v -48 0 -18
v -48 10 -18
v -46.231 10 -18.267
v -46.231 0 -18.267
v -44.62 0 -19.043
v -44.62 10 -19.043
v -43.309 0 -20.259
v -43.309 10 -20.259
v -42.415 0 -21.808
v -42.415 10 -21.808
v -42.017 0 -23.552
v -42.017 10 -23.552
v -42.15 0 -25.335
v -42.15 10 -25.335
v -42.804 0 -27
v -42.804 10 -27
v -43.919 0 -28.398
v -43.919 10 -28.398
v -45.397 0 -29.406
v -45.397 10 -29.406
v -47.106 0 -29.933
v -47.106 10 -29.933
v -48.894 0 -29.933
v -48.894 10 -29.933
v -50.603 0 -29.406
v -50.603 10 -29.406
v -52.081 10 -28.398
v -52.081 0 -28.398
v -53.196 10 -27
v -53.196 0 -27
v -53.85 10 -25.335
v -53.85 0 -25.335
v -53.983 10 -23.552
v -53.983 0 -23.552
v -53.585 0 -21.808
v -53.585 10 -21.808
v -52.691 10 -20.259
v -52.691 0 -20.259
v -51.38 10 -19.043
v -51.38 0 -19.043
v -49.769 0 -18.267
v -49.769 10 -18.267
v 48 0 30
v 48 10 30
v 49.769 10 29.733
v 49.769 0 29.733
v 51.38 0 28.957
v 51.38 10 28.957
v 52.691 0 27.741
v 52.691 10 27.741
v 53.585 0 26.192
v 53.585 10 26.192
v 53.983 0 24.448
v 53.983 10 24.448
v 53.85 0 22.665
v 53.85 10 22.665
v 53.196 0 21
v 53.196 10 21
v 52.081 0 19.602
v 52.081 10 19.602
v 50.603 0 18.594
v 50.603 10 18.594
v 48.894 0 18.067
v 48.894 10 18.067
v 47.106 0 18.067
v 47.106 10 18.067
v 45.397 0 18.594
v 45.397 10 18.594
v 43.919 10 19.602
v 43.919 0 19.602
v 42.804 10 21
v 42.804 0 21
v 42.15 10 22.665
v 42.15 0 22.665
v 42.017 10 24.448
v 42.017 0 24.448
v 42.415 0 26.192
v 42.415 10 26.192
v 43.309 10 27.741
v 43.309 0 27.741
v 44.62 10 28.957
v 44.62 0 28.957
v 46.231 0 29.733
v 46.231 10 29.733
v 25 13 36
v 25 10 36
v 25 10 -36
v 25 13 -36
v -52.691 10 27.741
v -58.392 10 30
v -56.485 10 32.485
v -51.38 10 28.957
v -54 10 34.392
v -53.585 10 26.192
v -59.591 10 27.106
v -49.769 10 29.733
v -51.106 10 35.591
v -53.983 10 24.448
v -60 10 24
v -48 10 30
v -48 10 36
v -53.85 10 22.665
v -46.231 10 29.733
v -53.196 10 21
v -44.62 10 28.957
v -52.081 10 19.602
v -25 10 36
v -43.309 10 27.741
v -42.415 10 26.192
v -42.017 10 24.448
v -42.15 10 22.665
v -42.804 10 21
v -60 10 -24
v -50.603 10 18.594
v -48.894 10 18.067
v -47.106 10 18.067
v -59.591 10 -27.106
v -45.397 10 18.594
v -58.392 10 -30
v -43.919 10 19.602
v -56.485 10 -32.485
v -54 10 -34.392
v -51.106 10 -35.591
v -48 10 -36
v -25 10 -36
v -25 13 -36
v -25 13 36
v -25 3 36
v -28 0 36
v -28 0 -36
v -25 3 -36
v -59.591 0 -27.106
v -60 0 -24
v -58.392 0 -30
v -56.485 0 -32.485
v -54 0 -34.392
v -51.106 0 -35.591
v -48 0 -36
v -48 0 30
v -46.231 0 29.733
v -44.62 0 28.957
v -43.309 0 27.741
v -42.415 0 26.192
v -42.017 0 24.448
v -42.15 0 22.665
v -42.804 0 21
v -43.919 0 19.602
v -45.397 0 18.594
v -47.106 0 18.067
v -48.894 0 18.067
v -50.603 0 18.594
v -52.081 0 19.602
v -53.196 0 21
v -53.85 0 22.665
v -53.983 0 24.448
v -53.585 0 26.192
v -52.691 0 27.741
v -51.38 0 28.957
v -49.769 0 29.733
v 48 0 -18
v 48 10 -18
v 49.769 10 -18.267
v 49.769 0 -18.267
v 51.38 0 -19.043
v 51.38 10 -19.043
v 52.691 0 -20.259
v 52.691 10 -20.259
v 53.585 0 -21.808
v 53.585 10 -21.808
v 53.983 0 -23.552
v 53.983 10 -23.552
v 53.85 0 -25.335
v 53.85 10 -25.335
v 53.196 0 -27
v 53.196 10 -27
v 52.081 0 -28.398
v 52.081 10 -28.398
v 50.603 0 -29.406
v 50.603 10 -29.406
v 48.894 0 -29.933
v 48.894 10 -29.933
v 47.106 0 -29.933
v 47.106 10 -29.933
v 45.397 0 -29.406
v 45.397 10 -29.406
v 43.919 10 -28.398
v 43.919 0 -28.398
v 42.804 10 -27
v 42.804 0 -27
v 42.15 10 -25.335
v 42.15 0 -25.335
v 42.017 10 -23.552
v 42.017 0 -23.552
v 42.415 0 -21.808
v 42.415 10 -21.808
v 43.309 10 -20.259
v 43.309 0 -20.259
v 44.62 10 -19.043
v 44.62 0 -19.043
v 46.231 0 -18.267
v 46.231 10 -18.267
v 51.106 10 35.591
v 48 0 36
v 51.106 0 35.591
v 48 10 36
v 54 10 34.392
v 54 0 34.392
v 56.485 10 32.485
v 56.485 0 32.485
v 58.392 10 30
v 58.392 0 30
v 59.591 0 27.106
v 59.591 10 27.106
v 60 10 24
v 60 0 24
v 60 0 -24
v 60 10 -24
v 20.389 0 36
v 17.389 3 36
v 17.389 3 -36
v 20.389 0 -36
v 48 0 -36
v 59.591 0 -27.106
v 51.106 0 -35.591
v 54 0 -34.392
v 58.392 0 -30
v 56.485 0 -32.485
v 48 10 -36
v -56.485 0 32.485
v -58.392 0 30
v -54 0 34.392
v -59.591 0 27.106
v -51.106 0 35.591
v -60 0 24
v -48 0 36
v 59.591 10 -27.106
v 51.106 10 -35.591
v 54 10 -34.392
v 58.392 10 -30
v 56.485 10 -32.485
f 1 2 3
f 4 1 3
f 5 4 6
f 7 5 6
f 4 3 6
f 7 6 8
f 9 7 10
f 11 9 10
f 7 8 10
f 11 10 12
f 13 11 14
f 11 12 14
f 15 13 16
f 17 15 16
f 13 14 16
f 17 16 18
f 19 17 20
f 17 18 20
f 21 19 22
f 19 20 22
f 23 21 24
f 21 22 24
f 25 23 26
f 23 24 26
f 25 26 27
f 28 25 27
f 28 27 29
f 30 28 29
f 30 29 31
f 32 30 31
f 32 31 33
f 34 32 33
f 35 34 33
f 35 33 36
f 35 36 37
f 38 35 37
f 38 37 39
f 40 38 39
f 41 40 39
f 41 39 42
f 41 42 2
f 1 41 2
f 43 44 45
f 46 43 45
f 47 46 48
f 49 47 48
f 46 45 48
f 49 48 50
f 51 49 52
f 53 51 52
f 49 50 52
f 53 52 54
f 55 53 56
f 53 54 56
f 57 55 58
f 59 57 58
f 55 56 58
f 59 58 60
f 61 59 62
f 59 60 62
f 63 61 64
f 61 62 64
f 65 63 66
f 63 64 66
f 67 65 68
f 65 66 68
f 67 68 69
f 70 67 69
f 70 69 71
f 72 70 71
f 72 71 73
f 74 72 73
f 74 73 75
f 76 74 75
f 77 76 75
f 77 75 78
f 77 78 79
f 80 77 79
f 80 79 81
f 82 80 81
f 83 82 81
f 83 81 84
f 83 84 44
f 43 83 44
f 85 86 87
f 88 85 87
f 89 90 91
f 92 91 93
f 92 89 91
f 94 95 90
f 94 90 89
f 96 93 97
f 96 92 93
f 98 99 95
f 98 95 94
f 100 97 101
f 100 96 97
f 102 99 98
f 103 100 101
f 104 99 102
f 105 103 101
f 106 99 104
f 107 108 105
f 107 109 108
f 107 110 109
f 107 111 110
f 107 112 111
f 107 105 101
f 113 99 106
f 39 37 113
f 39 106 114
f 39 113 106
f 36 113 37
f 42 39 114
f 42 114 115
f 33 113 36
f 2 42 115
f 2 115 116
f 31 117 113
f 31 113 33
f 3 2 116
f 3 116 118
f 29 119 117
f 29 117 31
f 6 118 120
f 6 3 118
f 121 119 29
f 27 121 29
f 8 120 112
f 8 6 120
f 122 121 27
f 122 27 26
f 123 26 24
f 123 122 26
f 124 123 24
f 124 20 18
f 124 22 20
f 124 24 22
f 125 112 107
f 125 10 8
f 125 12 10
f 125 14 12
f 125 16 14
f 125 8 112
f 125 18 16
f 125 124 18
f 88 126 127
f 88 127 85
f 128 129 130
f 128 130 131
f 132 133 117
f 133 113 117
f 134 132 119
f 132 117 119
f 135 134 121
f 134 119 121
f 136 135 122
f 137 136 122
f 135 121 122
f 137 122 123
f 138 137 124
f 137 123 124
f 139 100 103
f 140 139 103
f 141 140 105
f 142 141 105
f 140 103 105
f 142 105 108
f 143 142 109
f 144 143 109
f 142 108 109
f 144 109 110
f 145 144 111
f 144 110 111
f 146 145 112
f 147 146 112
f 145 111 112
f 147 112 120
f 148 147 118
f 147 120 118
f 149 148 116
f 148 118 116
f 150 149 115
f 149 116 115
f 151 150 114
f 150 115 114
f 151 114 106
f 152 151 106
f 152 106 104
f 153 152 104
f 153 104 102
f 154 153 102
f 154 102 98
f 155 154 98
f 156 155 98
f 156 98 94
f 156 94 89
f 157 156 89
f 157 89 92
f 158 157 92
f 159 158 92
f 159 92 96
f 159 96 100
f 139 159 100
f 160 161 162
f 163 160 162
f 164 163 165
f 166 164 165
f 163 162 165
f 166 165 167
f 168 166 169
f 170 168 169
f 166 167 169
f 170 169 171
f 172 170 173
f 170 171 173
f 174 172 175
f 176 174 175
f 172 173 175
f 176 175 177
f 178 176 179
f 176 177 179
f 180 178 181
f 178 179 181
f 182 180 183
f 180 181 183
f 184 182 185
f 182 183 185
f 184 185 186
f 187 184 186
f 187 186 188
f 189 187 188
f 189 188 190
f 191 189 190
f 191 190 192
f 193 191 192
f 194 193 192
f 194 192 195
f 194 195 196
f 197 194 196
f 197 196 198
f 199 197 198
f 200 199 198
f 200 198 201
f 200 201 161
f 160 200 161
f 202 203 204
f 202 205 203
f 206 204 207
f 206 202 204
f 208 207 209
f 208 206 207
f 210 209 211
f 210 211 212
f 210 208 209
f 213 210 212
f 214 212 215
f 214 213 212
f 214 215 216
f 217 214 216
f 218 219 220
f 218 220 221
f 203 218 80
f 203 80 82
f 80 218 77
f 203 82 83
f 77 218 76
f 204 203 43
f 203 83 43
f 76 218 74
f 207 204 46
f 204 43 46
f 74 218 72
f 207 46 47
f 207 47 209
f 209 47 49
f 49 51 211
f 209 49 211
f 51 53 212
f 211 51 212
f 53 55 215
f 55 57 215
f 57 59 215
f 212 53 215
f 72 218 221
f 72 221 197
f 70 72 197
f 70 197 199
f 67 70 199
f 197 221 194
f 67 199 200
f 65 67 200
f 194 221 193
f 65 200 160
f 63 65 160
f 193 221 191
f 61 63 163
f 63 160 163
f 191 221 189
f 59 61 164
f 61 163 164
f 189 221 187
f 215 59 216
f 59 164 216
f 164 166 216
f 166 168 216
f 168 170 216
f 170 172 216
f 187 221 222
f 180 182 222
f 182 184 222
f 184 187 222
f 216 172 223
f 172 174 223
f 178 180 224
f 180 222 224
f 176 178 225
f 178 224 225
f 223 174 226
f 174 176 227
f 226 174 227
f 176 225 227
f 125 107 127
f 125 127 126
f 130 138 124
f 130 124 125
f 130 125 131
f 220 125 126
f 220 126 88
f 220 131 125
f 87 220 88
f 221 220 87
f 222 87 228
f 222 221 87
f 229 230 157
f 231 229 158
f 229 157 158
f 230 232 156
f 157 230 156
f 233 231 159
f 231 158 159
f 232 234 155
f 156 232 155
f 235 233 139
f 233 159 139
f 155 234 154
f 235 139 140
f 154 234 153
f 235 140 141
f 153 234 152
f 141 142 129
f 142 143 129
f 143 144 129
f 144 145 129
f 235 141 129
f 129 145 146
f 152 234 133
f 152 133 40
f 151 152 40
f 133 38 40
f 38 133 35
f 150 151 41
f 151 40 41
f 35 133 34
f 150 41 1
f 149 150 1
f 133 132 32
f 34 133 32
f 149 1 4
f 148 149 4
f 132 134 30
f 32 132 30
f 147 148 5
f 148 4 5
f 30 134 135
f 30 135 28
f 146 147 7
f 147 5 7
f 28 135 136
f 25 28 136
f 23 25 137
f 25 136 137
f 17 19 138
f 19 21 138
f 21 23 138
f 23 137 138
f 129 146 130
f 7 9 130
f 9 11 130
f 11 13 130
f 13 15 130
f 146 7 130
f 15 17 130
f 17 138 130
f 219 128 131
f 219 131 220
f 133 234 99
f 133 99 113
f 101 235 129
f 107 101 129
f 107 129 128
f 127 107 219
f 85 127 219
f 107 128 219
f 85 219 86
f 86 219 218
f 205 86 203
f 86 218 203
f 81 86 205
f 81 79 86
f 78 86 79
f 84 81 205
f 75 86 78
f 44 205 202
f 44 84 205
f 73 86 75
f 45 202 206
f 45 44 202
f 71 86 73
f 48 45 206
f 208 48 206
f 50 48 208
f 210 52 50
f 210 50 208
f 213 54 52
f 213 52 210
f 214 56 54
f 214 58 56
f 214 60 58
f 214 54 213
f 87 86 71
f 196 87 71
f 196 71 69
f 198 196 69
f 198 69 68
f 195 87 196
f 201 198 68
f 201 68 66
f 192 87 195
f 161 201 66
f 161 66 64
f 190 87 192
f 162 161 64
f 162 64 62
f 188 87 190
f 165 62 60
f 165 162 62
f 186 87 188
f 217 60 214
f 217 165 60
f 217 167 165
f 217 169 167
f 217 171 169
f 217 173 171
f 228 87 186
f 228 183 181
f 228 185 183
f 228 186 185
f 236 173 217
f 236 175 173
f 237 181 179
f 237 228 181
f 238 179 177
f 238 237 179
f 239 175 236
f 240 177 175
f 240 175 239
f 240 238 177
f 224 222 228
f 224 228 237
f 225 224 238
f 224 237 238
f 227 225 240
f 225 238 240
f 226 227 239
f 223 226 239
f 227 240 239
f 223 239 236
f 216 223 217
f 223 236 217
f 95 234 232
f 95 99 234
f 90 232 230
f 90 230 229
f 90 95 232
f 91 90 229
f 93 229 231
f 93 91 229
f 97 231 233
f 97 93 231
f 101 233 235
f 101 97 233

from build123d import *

# Parameters (mm, degrees)
SKETCH1_W           = 120
SKETCH1_H           = 72
BOSS_EXTRUDE1_DEPTH = 10
SKETCH2_R           = 6
CUT_EXTRUDE1_DEPTH  = 71.682388188
FILLET1_R           = 12
CUT_EXTRUDE2_DEPTH  = 95.254973344
SKETCH4_W           = 50
SKETCH4_H           = 72
BOSS_EXTRUDE3_DEPTH = 3


with BuildPart() as part:
    # Sketch1 → Boss-Extrude1 (new body)
    with BuildSketch(Plane(origin=(0, 0, 0), x_dir=(1, 0, 0), z_dir=(0, 1, 0))):
        Rectangle(SKETCH1_W, SKETCH1_H)
    extrude(amount=BOSS_EXTRUDE1_DEPTH)

    # Sketch2 → Cut-Extrude1 (cut, through all)
    with BuildSketch(Plane(origin=(0, 10, 0), x_dir=(1, 0, 0), z_dir=(0, 1, 0))):
        with Locations(Location((-48, 24, 0), (0, 0, 270))):
            Circle(SKETCH2_R)
        with Locations(Location((-48, -24, 0), (0, 0, 270))):
            Circle(SKETCH2_R)
        with Locations(Location((48, -24, 0), (0, 0, 270))):
            Circle(SKETCH2_R)
        with Locations(Location((48, 24, 0), (0, 0, 270))):
            Circle(SKETCH2_R)
    extrude(amount=-CUT_EXTRUDE1_DEPTH, mode=Mode.SUBTRACT)

    # Fillet1
    fillet1_edges = [part.edges().sort_by_distance(p)[0] for p in [
        (60, 5, 36),
        (-60, 5, 36),
        (-60, 5, -36),
        (60, 5, -36),
    ]]
    fillet(fillet1_edges, radius=FILLET1_R)

    # Sketch3 → Cut-Extrude2 (cut, through all)
    with BuildSketch(Plane.XY.offset(36)):
        Polygon((-28, 0), (-25, 3), (17.388701421, 3), (20.388701421, 0), align=None)
    extrude(amount=-CUT_EXTRUDE2_DEPTH, mode=Mode.SUBTRACT)

    # Sketch4 → Boss-Extrude3 (add)
    with BuildSketch(Plane(origin=(0, 10, 0), x_dir=(1, 0, 0), z_dir=(0, 1, 0))):
        Rectangle(SKETCH4_W, SKETCH4_H)
    extrude(amount=BOSS_EXTRUDE3_DEPTH)


solid = part.part
